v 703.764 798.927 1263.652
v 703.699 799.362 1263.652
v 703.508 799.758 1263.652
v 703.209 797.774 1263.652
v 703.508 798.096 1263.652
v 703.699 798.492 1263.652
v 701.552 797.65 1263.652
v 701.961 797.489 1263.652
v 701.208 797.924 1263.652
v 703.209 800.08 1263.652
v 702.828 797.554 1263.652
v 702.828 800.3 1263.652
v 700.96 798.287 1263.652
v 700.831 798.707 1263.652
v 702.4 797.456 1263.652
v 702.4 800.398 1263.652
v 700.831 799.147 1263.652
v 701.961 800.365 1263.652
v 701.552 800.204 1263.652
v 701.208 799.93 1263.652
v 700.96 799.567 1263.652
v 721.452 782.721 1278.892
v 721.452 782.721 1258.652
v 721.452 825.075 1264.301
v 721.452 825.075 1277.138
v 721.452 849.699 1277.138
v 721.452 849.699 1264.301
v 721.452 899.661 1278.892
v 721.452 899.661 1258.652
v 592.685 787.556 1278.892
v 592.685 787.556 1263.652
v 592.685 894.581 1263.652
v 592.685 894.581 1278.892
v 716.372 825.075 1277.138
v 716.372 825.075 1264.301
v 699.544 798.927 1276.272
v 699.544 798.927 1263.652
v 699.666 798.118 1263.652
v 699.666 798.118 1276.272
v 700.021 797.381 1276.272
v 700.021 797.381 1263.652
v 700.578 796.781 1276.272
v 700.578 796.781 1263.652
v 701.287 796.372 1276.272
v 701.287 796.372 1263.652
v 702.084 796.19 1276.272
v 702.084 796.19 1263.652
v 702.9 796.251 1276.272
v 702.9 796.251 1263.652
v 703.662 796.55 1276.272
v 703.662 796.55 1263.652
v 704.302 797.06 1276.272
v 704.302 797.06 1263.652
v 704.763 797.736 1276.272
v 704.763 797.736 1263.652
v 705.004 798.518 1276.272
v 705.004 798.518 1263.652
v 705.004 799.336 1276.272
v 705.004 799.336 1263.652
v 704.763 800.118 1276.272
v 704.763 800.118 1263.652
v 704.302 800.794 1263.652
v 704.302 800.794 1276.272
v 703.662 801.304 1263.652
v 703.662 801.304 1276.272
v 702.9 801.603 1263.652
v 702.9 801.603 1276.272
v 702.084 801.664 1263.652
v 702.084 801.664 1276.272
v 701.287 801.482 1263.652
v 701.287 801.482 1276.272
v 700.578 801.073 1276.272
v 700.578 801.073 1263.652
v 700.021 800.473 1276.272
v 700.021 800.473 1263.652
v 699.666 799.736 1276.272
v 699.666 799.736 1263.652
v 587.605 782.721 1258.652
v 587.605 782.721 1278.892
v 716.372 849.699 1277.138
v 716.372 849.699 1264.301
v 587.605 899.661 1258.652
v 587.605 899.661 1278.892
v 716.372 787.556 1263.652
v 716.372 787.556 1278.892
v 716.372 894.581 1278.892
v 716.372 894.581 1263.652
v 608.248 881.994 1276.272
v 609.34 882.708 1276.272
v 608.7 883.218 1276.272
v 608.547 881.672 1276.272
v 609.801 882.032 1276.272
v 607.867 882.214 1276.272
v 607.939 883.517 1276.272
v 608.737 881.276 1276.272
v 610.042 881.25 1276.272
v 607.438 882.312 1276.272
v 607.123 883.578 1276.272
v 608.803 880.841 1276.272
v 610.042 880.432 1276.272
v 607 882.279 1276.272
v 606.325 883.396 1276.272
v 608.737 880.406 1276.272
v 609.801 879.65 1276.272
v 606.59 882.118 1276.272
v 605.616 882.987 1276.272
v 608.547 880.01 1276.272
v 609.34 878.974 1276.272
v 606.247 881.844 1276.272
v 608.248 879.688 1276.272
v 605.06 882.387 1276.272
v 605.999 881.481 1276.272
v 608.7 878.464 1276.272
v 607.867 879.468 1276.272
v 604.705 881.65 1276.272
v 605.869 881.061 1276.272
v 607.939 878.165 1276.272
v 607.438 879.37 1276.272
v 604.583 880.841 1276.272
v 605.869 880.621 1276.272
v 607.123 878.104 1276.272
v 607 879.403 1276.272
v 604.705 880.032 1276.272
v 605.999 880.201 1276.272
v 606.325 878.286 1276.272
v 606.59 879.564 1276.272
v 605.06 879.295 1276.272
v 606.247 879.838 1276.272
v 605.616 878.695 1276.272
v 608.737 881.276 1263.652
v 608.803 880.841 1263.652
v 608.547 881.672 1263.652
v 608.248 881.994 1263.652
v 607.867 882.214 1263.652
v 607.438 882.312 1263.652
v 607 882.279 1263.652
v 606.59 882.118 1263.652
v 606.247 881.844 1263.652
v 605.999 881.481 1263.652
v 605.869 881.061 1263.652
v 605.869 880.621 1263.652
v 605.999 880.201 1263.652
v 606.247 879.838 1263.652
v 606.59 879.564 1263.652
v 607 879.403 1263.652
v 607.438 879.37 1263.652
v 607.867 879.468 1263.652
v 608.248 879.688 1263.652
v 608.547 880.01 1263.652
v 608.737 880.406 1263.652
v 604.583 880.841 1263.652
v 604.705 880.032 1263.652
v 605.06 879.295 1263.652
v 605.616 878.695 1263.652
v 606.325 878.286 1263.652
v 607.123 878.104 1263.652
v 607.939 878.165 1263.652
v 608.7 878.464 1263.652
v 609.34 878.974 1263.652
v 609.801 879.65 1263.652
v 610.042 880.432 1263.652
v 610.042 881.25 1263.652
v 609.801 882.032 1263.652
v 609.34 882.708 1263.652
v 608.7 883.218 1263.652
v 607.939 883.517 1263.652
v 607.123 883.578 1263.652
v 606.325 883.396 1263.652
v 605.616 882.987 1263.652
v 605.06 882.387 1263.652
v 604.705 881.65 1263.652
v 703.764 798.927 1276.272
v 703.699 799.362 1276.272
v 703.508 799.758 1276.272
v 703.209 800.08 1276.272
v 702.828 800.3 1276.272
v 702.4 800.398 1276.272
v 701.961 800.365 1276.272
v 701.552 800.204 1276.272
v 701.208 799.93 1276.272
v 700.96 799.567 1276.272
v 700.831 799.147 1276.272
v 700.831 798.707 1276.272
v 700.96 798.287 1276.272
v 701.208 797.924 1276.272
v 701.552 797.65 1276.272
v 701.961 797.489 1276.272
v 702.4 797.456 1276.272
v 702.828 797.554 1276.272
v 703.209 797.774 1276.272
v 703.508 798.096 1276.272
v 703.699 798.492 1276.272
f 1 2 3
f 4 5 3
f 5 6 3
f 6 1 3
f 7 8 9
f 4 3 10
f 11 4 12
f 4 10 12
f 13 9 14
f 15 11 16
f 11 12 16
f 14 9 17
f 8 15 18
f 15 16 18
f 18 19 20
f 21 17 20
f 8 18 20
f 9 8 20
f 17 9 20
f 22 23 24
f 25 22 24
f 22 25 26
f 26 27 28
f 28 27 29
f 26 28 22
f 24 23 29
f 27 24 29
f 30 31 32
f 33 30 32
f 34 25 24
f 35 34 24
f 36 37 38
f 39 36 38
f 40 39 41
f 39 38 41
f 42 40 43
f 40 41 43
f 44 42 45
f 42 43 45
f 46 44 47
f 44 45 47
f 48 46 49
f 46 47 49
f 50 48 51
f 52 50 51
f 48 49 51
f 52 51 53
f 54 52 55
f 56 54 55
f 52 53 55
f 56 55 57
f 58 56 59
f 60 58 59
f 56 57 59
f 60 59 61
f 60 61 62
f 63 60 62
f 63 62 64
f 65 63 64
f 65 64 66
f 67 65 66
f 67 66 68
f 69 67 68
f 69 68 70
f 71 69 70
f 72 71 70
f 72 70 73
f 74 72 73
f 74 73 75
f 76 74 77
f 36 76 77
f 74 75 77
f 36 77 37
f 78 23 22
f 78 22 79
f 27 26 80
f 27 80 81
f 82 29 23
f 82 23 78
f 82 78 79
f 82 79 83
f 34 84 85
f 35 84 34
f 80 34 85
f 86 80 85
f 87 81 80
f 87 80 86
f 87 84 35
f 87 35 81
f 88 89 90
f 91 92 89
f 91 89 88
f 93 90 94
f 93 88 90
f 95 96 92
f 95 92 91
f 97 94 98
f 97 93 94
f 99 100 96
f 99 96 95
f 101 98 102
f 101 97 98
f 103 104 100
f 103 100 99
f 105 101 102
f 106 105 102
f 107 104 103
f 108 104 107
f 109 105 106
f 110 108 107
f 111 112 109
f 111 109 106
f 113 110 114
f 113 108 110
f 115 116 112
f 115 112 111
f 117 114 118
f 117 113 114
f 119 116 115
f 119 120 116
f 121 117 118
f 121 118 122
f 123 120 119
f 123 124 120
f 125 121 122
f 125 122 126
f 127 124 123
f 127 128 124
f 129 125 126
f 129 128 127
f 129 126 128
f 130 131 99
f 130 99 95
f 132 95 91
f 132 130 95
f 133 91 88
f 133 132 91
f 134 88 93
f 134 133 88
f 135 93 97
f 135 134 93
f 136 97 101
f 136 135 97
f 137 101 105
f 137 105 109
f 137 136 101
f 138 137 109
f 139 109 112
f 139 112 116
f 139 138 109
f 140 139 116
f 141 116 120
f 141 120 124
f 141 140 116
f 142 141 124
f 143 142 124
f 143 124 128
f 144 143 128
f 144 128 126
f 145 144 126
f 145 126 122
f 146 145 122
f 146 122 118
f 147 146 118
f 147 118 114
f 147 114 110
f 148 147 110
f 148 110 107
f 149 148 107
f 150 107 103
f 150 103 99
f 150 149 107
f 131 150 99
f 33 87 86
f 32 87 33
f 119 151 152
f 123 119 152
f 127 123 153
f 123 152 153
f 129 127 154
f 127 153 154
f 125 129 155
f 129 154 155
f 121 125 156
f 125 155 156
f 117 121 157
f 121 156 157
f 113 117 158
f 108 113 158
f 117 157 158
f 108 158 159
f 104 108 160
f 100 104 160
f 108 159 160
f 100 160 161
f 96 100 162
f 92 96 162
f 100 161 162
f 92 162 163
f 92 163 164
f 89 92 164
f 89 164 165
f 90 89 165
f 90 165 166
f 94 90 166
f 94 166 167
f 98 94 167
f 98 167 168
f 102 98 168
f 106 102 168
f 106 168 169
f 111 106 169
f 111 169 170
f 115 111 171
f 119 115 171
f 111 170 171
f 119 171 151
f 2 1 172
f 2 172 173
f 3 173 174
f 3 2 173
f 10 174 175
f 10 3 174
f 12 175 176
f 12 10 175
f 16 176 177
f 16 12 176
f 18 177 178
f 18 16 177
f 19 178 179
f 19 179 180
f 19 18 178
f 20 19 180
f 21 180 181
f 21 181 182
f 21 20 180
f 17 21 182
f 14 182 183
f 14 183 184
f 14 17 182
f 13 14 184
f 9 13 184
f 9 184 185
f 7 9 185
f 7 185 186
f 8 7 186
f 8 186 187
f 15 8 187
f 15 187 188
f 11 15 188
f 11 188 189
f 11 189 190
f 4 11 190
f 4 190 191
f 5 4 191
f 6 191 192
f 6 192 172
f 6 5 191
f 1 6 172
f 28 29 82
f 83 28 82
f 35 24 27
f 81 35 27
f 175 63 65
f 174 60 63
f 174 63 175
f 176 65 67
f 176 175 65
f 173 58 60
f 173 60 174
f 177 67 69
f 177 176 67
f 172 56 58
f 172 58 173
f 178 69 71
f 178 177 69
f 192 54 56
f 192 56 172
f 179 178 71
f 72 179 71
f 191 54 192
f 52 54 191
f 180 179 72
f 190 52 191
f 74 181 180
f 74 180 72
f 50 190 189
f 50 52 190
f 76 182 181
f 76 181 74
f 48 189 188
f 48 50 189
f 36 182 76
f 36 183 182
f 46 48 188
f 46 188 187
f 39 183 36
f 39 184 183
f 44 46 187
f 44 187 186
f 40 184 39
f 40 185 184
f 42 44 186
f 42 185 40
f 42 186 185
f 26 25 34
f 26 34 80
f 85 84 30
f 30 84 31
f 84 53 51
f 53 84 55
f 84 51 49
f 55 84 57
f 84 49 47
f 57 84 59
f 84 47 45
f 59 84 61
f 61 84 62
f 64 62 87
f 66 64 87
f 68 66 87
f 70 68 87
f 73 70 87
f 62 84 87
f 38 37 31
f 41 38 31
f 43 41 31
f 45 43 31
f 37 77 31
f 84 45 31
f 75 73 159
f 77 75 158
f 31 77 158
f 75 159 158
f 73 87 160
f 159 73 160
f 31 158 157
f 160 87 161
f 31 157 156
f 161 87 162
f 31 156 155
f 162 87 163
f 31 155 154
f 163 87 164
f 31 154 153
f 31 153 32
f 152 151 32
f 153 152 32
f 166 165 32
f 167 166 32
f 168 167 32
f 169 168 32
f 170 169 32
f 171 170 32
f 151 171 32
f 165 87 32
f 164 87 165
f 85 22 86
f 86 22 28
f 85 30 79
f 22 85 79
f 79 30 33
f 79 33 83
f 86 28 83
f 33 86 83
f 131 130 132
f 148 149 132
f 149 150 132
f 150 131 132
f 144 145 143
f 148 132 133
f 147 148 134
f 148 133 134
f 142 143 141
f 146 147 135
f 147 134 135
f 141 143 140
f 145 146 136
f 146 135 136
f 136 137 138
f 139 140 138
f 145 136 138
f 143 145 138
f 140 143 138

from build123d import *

# Parameters (mm, degrees)
SKETCH1_W           = 123.686846594
SKETCH1_H           = 107.02436985
BOSS_EXTRUDE2_DEPTH = 5
SKETCH2_W           = 133.846846594
SKETCH2_H           = 116.939920661
SKETCH2_W_2         = 123.686846594
SKETCH2_H_2         = 107.02436985
BOSS_EXTRUDE4_DEPTH = 20.24
SKETCH4_R           = 2.745
SKETCH4_R_2         = 1.475
BOSS_EXTRUDE5_DEPTH = 12.62
SKETCH5_W           = 12.83643861
SKETCH5_H           = 24.624173529
CUT_EXTRUDE3_DEPTH  = 10


with BuildPart() as part:
    # Sketch1 → Boss-Extrude2 (new body)
    with BuildSketch(Plane(origin=(0, 0, 1258.652497842), x_dir=(-1, 0, 0), z_dir=(0, 0, -1))):
        with Locations((-654.528433331, 841.068613897)):
            Rectangle(SKETCH1_W, SKETCH1_H)
    extrude(amount=-BOSS_EXTRUDE2_DEPTH)

    # Sketch2 → Boss-Extrude4 (add)
    with BuildSketch(Plane(origin=(0, 0, 1258.652497842), x_dir=(-1, 0, 0), z_dir=(0, 0, -1))):
        with Locations((-654.528433331, 841.190838492)):
            Rectangle(SKETCH2_W, SKETCH2_H)
        with Locations((-654.528433331, 841.068613897)):
            Rectangle(SKETCH2_W_2, SKETCH2_H_2, mode=Mode.SUBTRACT)
    extrude(amount=-BOSS_EXTRUDE4_DEPTH)

    # Sketch4 → Boss-Extrude5 (add)
    # profile 1 of 2: a face of its own
    with BuildSketch(Plane.XY.offset(1263.652497842)):
        with Locations(Location((607.327962296, 880.84094357, 0), (0, 0, 180))):
            Circle(SKETCH4_R)
        with Locations((607.327962296, 880.84094357)):
            Circle(SKETCH4_R_2, mode=Mode.SUBTRACT)
    # profile 2 of 2: a face of its own
    with BuildSketch(Plane.XY.offset(1263.652497842)):
        with Locations(Location((702.289411045, 798.927110343, 0), (0, 0, 180))):
            Circle(SKETCH4_R)
        with Locations((702.289411045, 798.927110343)):
            Circle(SKETCH4_R_2, mode=Mode.SUBTRACT)
    extrude(amount=BOSS_EXTRUDE5_DEPTH)

    # Sketch5 → Cut-Extrude3 (cut)
    with BuildSketch(Plane(origin=(721.451856628, 0, 0), x_dir=(0, 0, -1), z_dir=(1, 0, 0))):
        with Locations((-1270.719437851, 837.387376974)):
            Rectangle(SKETCH5_W, SKETCH5_H)
    extrude(amount=-CUT_EXTRUDE3_DEPTH, mode=Mode.SUBTRACT)


solid = part.part
